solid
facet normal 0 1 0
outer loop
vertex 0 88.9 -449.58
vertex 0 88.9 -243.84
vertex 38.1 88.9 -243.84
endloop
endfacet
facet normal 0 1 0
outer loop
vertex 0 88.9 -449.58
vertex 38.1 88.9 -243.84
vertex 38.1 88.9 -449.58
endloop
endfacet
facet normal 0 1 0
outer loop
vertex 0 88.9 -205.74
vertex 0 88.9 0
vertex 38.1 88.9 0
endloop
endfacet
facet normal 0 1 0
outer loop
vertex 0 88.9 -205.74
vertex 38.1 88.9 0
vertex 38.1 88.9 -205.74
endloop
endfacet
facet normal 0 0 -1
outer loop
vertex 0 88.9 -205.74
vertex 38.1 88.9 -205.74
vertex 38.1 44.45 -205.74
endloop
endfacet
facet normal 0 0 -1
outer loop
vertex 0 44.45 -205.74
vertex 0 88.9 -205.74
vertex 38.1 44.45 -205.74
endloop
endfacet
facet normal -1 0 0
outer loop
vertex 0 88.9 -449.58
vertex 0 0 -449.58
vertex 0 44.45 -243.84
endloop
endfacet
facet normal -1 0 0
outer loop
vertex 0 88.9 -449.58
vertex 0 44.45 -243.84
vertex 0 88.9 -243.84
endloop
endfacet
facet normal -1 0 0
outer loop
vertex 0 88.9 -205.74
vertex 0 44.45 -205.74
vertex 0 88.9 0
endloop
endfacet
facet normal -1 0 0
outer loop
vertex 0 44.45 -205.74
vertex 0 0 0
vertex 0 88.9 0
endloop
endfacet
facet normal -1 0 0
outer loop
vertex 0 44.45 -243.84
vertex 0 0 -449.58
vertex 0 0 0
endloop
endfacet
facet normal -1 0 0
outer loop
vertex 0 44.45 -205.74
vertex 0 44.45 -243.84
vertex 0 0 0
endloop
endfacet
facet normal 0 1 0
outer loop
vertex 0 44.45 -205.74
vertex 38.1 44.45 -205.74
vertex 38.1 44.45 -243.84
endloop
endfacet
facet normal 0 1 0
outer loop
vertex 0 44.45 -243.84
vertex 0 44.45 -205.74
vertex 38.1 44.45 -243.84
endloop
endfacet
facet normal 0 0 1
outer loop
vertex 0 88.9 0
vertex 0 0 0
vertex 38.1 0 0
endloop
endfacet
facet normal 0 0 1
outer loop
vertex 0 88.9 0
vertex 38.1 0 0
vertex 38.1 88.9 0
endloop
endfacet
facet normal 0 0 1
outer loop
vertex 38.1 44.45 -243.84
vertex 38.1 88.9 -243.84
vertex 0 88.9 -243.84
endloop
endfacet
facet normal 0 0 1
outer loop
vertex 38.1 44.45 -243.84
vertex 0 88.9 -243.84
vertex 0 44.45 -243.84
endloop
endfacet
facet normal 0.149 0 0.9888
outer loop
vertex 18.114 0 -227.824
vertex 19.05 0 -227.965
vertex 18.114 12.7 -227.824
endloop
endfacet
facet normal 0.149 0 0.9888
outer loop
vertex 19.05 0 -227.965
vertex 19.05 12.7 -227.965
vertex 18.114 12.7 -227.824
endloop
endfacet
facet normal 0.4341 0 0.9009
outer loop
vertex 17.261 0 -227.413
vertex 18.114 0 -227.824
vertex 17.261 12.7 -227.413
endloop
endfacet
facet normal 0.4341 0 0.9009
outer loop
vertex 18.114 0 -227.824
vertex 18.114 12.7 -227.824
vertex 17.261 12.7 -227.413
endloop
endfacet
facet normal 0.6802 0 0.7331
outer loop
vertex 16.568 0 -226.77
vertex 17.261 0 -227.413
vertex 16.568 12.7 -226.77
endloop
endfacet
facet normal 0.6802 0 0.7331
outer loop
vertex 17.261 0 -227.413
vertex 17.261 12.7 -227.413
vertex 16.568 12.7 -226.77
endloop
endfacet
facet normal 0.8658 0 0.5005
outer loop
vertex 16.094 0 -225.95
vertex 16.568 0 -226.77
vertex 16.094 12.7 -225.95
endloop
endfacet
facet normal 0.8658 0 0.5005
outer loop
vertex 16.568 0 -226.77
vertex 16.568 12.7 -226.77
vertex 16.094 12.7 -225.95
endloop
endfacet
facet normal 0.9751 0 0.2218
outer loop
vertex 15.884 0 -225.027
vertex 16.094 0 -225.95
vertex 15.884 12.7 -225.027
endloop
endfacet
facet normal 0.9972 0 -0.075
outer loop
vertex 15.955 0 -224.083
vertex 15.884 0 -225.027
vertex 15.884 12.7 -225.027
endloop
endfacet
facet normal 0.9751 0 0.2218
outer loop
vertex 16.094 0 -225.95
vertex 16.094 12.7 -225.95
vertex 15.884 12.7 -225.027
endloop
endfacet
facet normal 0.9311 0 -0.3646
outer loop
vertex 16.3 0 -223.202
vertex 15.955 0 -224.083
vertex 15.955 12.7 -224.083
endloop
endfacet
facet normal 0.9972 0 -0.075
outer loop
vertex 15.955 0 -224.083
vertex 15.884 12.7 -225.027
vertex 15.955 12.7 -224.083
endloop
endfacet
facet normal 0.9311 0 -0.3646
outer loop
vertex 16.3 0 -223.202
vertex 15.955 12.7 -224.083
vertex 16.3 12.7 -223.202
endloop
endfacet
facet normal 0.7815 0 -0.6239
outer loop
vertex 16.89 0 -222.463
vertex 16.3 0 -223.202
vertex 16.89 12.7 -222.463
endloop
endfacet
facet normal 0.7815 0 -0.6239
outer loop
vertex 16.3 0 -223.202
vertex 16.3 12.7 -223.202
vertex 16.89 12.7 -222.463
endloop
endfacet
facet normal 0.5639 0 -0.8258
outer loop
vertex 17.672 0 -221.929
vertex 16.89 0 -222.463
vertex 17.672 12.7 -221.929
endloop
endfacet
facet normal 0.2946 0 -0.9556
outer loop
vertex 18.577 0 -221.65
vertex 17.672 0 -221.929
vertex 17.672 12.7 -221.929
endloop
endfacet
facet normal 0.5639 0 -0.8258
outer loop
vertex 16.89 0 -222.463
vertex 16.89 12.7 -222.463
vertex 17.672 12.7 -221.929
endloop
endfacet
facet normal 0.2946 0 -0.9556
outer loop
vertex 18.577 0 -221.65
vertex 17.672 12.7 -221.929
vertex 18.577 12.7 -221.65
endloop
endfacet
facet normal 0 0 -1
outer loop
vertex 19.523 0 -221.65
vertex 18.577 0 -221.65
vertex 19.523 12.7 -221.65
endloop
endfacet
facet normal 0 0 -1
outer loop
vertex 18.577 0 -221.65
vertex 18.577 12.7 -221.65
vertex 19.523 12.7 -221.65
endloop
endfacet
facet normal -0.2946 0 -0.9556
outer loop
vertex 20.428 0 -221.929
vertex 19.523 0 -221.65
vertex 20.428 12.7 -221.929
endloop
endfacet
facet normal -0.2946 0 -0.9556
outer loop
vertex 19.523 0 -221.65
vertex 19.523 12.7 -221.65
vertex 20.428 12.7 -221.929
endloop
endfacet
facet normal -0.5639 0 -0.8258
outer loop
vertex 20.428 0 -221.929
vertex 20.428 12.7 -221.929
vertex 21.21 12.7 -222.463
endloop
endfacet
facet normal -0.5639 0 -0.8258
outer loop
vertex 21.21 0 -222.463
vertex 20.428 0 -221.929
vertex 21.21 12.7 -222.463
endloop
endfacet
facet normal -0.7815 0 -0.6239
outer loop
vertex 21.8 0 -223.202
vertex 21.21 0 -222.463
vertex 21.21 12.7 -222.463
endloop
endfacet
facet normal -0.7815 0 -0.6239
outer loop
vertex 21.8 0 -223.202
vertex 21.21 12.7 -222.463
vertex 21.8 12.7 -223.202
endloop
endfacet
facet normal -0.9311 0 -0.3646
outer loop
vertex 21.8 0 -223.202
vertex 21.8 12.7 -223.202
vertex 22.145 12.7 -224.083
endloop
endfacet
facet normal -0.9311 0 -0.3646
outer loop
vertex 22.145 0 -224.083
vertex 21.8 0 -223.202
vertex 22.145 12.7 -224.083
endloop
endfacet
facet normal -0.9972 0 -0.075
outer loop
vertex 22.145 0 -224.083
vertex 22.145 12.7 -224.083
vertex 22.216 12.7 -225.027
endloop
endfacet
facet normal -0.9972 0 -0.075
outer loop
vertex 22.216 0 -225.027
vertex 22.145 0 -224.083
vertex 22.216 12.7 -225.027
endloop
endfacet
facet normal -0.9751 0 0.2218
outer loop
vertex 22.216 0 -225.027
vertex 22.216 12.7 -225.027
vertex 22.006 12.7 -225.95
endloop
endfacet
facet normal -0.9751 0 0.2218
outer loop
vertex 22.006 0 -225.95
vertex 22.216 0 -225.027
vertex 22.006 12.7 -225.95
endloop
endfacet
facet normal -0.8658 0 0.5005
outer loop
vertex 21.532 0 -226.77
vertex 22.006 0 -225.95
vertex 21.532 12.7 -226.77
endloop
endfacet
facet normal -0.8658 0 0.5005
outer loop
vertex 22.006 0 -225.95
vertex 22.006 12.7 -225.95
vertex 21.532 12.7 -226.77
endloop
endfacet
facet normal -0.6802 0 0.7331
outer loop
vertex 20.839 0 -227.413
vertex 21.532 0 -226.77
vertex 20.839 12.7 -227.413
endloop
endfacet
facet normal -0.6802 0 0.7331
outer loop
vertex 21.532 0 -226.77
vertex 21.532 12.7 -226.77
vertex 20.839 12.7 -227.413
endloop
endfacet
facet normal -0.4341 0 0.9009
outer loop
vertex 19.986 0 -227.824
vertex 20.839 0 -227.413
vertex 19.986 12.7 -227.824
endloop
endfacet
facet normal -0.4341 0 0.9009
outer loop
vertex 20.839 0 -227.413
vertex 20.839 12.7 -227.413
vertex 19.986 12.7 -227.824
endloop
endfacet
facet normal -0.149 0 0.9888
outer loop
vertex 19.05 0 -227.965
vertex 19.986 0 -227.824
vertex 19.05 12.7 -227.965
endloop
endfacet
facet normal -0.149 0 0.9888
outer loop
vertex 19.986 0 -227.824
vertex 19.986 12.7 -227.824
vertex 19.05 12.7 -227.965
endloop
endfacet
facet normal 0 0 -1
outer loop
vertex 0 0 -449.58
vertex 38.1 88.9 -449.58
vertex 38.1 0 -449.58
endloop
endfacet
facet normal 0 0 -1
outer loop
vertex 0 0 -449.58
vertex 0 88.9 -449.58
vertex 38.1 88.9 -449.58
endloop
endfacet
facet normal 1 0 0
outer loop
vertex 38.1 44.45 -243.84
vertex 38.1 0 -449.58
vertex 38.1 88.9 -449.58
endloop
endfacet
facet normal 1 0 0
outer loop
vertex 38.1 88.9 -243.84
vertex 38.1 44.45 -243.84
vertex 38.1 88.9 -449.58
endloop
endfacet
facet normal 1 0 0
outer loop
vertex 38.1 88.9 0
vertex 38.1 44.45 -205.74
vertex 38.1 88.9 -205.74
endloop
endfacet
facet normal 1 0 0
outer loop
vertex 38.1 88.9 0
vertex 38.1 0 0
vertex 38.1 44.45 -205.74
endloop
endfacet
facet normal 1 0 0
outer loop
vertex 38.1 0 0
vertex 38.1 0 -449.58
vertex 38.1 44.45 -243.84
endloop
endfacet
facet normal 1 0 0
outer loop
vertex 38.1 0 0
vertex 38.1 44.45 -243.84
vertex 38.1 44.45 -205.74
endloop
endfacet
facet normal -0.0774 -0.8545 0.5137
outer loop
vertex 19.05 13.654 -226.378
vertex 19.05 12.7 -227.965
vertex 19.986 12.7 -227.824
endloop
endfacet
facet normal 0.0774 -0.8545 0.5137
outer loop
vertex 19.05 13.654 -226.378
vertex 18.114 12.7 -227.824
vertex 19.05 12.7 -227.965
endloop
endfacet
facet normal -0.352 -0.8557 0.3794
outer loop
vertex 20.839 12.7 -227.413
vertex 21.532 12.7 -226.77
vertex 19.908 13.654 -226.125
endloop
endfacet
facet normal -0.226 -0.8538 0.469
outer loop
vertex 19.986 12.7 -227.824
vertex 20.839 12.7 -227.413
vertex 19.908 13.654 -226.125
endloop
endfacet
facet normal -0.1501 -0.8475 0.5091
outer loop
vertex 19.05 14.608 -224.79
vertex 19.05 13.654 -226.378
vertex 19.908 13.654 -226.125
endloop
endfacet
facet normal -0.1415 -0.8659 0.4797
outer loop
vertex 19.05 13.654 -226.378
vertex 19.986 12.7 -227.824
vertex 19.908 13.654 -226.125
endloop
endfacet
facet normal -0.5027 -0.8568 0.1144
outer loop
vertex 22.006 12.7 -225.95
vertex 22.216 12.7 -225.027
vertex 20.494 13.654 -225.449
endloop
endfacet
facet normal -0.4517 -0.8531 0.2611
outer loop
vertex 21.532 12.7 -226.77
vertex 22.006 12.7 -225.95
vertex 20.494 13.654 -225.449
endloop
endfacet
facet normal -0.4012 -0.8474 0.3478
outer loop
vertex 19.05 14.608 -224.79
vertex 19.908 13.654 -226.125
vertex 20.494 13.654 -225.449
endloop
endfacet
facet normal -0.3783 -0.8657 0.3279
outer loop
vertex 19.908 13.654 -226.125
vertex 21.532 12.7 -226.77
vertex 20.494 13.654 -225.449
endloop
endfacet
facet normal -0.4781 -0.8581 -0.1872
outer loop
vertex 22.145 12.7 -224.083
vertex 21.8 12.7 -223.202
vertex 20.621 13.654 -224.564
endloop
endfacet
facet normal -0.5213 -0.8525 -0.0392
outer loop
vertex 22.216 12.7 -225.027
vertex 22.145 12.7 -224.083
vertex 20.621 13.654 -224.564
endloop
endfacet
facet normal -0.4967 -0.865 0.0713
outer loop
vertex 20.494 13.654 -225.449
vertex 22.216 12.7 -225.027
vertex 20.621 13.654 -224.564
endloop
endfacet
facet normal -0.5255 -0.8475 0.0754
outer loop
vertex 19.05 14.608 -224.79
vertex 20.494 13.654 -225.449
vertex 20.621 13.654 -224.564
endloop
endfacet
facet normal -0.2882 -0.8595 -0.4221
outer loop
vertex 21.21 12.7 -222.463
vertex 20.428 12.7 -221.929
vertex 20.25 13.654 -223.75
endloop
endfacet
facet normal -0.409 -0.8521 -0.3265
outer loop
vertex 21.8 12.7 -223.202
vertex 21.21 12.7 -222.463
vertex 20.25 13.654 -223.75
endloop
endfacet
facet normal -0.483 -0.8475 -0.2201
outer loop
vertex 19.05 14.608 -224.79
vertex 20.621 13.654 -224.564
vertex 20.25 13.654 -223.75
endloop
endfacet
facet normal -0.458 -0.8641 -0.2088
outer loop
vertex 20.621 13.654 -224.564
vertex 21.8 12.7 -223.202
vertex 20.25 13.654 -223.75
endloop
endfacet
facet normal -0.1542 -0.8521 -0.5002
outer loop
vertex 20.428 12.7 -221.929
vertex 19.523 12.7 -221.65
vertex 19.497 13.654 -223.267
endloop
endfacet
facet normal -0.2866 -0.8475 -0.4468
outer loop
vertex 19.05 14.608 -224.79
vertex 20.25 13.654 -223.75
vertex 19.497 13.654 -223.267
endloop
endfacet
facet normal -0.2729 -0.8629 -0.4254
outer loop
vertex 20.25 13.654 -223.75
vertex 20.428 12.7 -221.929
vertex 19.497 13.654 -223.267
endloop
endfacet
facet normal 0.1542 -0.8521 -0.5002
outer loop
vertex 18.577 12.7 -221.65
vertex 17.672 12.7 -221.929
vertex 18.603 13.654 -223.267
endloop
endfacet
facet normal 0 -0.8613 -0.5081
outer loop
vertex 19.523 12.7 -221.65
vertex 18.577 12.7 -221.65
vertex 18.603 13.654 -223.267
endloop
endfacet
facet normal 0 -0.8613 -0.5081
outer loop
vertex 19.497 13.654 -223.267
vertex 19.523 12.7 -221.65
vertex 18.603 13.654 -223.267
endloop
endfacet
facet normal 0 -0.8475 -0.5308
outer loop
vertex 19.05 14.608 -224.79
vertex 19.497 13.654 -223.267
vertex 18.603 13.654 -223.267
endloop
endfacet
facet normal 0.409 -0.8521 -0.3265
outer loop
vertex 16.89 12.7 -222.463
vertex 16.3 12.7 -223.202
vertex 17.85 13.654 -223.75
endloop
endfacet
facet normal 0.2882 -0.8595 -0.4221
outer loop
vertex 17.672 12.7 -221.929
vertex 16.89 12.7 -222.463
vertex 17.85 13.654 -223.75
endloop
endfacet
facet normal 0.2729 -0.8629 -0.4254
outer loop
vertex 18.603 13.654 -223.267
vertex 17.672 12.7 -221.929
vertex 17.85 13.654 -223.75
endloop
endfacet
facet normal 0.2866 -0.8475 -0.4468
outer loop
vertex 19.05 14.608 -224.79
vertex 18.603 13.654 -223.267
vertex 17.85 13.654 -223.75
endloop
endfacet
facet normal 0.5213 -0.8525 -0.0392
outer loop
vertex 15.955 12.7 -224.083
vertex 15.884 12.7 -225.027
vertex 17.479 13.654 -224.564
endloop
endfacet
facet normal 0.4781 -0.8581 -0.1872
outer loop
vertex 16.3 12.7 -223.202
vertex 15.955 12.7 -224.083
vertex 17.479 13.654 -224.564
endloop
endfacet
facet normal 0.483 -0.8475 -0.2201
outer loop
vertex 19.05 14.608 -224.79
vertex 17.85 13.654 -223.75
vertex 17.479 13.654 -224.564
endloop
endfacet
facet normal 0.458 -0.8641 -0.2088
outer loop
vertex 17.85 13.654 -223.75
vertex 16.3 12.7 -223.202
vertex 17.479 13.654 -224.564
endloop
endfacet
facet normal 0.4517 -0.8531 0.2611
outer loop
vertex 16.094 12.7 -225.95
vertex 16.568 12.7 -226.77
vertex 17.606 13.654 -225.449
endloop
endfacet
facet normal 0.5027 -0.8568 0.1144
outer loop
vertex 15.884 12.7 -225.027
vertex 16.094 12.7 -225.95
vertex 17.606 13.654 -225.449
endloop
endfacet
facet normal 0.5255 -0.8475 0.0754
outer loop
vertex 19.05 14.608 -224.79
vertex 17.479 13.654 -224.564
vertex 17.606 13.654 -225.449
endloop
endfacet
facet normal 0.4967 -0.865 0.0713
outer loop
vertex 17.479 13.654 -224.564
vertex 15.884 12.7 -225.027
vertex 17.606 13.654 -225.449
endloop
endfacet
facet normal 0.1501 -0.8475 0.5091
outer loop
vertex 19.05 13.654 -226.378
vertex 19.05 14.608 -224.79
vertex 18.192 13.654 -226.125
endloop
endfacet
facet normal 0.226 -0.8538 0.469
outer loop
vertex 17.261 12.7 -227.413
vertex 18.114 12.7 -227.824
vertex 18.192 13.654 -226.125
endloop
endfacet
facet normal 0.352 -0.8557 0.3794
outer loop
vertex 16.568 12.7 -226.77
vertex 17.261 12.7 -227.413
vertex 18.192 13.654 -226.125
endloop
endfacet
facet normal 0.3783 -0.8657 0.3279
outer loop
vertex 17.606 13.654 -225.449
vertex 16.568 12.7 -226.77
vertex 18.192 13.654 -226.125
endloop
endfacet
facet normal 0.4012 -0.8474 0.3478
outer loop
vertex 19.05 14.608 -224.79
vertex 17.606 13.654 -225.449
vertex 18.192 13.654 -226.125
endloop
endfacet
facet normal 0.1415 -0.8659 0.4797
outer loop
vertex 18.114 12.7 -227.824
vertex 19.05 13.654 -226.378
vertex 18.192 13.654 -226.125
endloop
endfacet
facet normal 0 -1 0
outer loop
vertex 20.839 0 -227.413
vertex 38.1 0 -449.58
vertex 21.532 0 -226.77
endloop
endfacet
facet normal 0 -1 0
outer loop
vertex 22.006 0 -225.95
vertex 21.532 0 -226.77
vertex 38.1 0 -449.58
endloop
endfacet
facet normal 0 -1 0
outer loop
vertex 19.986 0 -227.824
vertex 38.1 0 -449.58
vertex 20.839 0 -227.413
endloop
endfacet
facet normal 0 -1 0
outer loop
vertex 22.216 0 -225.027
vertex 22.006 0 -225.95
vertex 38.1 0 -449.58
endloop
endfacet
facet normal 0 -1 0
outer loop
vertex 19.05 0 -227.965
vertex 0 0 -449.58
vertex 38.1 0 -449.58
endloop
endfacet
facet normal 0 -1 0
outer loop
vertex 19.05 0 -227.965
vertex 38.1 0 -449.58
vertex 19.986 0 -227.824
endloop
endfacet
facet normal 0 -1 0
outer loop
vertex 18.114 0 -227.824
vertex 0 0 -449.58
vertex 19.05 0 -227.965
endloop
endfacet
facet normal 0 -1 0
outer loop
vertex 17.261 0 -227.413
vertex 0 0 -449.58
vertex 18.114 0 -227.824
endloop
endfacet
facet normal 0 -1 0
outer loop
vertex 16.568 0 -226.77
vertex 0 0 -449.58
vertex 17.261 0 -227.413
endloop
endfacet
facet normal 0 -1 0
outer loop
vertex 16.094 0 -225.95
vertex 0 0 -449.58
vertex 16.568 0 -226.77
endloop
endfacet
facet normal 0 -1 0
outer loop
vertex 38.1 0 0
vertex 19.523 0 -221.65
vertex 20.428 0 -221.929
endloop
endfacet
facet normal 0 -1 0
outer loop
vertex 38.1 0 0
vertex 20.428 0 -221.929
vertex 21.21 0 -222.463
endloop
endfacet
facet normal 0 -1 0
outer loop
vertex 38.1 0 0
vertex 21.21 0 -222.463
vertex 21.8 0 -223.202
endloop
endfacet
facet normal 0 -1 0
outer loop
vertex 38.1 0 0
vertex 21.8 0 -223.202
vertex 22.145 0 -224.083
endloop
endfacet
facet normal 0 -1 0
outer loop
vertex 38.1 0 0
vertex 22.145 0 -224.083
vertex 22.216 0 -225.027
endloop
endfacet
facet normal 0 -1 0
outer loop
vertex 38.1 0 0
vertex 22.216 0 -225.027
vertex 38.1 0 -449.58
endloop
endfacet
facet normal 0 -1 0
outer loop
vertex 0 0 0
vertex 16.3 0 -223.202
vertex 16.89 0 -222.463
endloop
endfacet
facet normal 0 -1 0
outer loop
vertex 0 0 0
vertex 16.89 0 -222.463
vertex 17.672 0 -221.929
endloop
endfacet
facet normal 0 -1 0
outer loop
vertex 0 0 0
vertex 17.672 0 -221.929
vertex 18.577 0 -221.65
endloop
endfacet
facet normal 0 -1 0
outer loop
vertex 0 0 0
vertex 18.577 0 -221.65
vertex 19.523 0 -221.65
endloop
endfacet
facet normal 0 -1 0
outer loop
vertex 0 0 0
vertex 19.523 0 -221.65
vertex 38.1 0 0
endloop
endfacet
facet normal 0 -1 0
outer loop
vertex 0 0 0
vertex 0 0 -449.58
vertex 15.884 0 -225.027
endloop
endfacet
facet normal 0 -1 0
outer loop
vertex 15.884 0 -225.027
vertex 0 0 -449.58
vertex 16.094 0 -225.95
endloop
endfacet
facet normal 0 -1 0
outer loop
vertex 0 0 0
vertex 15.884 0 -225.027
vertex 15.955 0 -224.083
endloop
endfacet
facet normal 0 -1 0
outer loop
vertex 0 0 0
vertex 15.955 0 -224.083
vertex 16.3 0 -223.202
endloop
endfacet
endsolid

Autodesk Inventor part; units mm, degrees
ref_plane "YZ Plane" through (0, 0, 0) normal (1, 0, 0) x (0, 1, 0)
ref_plane "XZ Plane" through (0, 0, 0) normal (0, 1, 0) x (-1, 0, 0)
ref_plane "XY Plane" through (0, 0, 0) normal (0, 0, 1) x (1, 0, 0)
sketch "Sketch1" plane through (0, 0, 0) normal (1, 0, 0) x (0, 1, 0)
  line L0 (0, 0) -> (88.9, 0)
  line L1 (88.9, 0) -> (88.9, -449.58)
  line L2 (88.9, -449.58) -> (0, -449.58)
  line L3 (0, -449.58) -> (0, 0)
  dimension "d0" = 88.9
  dimension "d1" = 449.58
extrude "Extrusion1" add sketch "Sketch1" along normal blind 38.1
sketch "Sketch2" plane through (38.1, 0, 0) normal (1, 0, 0) x (0, 0, -1)
  line L0 (0, 88.9) -> (0, 0) projected
  line L1 (0, 0) -> (449.58, 0) projected
  line L2 (449.58, 88.9) -> (0, 88.9) projected
  line L3 (205.74, 88.9) -> (205.74, 44.45)
  line L4 (224.79, 88.9) -> (224.79, 0) construction
  line L5 (243.84, 88.9) -> (243.84, 44.45)
  line L6 (205.74, 44.45) -> (243.84, 44.45)
  line L7 (205.74, 88.9) -> (243.84, 88.9)
  dimension "d4" = 44.45
  dimension "d5" = 205.74
extrude "Extrusion2" cut sketch "Sketch2" against normal blind 50.8
sketch "Sketch3" plane through (0, 0, -449.58) normal (0, -1, 0) x (1, 0, 0)
  line L0 (0, 0) -> (0, 449.58) projected
  line L1 (0, 0) -> (38.1, 0) projected
  line L2 (38.1, 449.58) -> (38.1, 0) projected
  line L3 (0, 449.58) -> (38.1, 449.58) projected
  line L4 (19.05, 449.58) -> (19.05, 0) construction
  line L5 (0, 224.79) -> (38.1, 224.79) construction
  circle A0 centre (19.05, 224.79) radius 7.9481
hole "Hole1" at (19.05, 0, -224.79) direction (0, 1, 0) diameter 6.35 depth 12.7 tip angle 118
properties part number "hubRingInnerWood" material "Wood (Oak)"
